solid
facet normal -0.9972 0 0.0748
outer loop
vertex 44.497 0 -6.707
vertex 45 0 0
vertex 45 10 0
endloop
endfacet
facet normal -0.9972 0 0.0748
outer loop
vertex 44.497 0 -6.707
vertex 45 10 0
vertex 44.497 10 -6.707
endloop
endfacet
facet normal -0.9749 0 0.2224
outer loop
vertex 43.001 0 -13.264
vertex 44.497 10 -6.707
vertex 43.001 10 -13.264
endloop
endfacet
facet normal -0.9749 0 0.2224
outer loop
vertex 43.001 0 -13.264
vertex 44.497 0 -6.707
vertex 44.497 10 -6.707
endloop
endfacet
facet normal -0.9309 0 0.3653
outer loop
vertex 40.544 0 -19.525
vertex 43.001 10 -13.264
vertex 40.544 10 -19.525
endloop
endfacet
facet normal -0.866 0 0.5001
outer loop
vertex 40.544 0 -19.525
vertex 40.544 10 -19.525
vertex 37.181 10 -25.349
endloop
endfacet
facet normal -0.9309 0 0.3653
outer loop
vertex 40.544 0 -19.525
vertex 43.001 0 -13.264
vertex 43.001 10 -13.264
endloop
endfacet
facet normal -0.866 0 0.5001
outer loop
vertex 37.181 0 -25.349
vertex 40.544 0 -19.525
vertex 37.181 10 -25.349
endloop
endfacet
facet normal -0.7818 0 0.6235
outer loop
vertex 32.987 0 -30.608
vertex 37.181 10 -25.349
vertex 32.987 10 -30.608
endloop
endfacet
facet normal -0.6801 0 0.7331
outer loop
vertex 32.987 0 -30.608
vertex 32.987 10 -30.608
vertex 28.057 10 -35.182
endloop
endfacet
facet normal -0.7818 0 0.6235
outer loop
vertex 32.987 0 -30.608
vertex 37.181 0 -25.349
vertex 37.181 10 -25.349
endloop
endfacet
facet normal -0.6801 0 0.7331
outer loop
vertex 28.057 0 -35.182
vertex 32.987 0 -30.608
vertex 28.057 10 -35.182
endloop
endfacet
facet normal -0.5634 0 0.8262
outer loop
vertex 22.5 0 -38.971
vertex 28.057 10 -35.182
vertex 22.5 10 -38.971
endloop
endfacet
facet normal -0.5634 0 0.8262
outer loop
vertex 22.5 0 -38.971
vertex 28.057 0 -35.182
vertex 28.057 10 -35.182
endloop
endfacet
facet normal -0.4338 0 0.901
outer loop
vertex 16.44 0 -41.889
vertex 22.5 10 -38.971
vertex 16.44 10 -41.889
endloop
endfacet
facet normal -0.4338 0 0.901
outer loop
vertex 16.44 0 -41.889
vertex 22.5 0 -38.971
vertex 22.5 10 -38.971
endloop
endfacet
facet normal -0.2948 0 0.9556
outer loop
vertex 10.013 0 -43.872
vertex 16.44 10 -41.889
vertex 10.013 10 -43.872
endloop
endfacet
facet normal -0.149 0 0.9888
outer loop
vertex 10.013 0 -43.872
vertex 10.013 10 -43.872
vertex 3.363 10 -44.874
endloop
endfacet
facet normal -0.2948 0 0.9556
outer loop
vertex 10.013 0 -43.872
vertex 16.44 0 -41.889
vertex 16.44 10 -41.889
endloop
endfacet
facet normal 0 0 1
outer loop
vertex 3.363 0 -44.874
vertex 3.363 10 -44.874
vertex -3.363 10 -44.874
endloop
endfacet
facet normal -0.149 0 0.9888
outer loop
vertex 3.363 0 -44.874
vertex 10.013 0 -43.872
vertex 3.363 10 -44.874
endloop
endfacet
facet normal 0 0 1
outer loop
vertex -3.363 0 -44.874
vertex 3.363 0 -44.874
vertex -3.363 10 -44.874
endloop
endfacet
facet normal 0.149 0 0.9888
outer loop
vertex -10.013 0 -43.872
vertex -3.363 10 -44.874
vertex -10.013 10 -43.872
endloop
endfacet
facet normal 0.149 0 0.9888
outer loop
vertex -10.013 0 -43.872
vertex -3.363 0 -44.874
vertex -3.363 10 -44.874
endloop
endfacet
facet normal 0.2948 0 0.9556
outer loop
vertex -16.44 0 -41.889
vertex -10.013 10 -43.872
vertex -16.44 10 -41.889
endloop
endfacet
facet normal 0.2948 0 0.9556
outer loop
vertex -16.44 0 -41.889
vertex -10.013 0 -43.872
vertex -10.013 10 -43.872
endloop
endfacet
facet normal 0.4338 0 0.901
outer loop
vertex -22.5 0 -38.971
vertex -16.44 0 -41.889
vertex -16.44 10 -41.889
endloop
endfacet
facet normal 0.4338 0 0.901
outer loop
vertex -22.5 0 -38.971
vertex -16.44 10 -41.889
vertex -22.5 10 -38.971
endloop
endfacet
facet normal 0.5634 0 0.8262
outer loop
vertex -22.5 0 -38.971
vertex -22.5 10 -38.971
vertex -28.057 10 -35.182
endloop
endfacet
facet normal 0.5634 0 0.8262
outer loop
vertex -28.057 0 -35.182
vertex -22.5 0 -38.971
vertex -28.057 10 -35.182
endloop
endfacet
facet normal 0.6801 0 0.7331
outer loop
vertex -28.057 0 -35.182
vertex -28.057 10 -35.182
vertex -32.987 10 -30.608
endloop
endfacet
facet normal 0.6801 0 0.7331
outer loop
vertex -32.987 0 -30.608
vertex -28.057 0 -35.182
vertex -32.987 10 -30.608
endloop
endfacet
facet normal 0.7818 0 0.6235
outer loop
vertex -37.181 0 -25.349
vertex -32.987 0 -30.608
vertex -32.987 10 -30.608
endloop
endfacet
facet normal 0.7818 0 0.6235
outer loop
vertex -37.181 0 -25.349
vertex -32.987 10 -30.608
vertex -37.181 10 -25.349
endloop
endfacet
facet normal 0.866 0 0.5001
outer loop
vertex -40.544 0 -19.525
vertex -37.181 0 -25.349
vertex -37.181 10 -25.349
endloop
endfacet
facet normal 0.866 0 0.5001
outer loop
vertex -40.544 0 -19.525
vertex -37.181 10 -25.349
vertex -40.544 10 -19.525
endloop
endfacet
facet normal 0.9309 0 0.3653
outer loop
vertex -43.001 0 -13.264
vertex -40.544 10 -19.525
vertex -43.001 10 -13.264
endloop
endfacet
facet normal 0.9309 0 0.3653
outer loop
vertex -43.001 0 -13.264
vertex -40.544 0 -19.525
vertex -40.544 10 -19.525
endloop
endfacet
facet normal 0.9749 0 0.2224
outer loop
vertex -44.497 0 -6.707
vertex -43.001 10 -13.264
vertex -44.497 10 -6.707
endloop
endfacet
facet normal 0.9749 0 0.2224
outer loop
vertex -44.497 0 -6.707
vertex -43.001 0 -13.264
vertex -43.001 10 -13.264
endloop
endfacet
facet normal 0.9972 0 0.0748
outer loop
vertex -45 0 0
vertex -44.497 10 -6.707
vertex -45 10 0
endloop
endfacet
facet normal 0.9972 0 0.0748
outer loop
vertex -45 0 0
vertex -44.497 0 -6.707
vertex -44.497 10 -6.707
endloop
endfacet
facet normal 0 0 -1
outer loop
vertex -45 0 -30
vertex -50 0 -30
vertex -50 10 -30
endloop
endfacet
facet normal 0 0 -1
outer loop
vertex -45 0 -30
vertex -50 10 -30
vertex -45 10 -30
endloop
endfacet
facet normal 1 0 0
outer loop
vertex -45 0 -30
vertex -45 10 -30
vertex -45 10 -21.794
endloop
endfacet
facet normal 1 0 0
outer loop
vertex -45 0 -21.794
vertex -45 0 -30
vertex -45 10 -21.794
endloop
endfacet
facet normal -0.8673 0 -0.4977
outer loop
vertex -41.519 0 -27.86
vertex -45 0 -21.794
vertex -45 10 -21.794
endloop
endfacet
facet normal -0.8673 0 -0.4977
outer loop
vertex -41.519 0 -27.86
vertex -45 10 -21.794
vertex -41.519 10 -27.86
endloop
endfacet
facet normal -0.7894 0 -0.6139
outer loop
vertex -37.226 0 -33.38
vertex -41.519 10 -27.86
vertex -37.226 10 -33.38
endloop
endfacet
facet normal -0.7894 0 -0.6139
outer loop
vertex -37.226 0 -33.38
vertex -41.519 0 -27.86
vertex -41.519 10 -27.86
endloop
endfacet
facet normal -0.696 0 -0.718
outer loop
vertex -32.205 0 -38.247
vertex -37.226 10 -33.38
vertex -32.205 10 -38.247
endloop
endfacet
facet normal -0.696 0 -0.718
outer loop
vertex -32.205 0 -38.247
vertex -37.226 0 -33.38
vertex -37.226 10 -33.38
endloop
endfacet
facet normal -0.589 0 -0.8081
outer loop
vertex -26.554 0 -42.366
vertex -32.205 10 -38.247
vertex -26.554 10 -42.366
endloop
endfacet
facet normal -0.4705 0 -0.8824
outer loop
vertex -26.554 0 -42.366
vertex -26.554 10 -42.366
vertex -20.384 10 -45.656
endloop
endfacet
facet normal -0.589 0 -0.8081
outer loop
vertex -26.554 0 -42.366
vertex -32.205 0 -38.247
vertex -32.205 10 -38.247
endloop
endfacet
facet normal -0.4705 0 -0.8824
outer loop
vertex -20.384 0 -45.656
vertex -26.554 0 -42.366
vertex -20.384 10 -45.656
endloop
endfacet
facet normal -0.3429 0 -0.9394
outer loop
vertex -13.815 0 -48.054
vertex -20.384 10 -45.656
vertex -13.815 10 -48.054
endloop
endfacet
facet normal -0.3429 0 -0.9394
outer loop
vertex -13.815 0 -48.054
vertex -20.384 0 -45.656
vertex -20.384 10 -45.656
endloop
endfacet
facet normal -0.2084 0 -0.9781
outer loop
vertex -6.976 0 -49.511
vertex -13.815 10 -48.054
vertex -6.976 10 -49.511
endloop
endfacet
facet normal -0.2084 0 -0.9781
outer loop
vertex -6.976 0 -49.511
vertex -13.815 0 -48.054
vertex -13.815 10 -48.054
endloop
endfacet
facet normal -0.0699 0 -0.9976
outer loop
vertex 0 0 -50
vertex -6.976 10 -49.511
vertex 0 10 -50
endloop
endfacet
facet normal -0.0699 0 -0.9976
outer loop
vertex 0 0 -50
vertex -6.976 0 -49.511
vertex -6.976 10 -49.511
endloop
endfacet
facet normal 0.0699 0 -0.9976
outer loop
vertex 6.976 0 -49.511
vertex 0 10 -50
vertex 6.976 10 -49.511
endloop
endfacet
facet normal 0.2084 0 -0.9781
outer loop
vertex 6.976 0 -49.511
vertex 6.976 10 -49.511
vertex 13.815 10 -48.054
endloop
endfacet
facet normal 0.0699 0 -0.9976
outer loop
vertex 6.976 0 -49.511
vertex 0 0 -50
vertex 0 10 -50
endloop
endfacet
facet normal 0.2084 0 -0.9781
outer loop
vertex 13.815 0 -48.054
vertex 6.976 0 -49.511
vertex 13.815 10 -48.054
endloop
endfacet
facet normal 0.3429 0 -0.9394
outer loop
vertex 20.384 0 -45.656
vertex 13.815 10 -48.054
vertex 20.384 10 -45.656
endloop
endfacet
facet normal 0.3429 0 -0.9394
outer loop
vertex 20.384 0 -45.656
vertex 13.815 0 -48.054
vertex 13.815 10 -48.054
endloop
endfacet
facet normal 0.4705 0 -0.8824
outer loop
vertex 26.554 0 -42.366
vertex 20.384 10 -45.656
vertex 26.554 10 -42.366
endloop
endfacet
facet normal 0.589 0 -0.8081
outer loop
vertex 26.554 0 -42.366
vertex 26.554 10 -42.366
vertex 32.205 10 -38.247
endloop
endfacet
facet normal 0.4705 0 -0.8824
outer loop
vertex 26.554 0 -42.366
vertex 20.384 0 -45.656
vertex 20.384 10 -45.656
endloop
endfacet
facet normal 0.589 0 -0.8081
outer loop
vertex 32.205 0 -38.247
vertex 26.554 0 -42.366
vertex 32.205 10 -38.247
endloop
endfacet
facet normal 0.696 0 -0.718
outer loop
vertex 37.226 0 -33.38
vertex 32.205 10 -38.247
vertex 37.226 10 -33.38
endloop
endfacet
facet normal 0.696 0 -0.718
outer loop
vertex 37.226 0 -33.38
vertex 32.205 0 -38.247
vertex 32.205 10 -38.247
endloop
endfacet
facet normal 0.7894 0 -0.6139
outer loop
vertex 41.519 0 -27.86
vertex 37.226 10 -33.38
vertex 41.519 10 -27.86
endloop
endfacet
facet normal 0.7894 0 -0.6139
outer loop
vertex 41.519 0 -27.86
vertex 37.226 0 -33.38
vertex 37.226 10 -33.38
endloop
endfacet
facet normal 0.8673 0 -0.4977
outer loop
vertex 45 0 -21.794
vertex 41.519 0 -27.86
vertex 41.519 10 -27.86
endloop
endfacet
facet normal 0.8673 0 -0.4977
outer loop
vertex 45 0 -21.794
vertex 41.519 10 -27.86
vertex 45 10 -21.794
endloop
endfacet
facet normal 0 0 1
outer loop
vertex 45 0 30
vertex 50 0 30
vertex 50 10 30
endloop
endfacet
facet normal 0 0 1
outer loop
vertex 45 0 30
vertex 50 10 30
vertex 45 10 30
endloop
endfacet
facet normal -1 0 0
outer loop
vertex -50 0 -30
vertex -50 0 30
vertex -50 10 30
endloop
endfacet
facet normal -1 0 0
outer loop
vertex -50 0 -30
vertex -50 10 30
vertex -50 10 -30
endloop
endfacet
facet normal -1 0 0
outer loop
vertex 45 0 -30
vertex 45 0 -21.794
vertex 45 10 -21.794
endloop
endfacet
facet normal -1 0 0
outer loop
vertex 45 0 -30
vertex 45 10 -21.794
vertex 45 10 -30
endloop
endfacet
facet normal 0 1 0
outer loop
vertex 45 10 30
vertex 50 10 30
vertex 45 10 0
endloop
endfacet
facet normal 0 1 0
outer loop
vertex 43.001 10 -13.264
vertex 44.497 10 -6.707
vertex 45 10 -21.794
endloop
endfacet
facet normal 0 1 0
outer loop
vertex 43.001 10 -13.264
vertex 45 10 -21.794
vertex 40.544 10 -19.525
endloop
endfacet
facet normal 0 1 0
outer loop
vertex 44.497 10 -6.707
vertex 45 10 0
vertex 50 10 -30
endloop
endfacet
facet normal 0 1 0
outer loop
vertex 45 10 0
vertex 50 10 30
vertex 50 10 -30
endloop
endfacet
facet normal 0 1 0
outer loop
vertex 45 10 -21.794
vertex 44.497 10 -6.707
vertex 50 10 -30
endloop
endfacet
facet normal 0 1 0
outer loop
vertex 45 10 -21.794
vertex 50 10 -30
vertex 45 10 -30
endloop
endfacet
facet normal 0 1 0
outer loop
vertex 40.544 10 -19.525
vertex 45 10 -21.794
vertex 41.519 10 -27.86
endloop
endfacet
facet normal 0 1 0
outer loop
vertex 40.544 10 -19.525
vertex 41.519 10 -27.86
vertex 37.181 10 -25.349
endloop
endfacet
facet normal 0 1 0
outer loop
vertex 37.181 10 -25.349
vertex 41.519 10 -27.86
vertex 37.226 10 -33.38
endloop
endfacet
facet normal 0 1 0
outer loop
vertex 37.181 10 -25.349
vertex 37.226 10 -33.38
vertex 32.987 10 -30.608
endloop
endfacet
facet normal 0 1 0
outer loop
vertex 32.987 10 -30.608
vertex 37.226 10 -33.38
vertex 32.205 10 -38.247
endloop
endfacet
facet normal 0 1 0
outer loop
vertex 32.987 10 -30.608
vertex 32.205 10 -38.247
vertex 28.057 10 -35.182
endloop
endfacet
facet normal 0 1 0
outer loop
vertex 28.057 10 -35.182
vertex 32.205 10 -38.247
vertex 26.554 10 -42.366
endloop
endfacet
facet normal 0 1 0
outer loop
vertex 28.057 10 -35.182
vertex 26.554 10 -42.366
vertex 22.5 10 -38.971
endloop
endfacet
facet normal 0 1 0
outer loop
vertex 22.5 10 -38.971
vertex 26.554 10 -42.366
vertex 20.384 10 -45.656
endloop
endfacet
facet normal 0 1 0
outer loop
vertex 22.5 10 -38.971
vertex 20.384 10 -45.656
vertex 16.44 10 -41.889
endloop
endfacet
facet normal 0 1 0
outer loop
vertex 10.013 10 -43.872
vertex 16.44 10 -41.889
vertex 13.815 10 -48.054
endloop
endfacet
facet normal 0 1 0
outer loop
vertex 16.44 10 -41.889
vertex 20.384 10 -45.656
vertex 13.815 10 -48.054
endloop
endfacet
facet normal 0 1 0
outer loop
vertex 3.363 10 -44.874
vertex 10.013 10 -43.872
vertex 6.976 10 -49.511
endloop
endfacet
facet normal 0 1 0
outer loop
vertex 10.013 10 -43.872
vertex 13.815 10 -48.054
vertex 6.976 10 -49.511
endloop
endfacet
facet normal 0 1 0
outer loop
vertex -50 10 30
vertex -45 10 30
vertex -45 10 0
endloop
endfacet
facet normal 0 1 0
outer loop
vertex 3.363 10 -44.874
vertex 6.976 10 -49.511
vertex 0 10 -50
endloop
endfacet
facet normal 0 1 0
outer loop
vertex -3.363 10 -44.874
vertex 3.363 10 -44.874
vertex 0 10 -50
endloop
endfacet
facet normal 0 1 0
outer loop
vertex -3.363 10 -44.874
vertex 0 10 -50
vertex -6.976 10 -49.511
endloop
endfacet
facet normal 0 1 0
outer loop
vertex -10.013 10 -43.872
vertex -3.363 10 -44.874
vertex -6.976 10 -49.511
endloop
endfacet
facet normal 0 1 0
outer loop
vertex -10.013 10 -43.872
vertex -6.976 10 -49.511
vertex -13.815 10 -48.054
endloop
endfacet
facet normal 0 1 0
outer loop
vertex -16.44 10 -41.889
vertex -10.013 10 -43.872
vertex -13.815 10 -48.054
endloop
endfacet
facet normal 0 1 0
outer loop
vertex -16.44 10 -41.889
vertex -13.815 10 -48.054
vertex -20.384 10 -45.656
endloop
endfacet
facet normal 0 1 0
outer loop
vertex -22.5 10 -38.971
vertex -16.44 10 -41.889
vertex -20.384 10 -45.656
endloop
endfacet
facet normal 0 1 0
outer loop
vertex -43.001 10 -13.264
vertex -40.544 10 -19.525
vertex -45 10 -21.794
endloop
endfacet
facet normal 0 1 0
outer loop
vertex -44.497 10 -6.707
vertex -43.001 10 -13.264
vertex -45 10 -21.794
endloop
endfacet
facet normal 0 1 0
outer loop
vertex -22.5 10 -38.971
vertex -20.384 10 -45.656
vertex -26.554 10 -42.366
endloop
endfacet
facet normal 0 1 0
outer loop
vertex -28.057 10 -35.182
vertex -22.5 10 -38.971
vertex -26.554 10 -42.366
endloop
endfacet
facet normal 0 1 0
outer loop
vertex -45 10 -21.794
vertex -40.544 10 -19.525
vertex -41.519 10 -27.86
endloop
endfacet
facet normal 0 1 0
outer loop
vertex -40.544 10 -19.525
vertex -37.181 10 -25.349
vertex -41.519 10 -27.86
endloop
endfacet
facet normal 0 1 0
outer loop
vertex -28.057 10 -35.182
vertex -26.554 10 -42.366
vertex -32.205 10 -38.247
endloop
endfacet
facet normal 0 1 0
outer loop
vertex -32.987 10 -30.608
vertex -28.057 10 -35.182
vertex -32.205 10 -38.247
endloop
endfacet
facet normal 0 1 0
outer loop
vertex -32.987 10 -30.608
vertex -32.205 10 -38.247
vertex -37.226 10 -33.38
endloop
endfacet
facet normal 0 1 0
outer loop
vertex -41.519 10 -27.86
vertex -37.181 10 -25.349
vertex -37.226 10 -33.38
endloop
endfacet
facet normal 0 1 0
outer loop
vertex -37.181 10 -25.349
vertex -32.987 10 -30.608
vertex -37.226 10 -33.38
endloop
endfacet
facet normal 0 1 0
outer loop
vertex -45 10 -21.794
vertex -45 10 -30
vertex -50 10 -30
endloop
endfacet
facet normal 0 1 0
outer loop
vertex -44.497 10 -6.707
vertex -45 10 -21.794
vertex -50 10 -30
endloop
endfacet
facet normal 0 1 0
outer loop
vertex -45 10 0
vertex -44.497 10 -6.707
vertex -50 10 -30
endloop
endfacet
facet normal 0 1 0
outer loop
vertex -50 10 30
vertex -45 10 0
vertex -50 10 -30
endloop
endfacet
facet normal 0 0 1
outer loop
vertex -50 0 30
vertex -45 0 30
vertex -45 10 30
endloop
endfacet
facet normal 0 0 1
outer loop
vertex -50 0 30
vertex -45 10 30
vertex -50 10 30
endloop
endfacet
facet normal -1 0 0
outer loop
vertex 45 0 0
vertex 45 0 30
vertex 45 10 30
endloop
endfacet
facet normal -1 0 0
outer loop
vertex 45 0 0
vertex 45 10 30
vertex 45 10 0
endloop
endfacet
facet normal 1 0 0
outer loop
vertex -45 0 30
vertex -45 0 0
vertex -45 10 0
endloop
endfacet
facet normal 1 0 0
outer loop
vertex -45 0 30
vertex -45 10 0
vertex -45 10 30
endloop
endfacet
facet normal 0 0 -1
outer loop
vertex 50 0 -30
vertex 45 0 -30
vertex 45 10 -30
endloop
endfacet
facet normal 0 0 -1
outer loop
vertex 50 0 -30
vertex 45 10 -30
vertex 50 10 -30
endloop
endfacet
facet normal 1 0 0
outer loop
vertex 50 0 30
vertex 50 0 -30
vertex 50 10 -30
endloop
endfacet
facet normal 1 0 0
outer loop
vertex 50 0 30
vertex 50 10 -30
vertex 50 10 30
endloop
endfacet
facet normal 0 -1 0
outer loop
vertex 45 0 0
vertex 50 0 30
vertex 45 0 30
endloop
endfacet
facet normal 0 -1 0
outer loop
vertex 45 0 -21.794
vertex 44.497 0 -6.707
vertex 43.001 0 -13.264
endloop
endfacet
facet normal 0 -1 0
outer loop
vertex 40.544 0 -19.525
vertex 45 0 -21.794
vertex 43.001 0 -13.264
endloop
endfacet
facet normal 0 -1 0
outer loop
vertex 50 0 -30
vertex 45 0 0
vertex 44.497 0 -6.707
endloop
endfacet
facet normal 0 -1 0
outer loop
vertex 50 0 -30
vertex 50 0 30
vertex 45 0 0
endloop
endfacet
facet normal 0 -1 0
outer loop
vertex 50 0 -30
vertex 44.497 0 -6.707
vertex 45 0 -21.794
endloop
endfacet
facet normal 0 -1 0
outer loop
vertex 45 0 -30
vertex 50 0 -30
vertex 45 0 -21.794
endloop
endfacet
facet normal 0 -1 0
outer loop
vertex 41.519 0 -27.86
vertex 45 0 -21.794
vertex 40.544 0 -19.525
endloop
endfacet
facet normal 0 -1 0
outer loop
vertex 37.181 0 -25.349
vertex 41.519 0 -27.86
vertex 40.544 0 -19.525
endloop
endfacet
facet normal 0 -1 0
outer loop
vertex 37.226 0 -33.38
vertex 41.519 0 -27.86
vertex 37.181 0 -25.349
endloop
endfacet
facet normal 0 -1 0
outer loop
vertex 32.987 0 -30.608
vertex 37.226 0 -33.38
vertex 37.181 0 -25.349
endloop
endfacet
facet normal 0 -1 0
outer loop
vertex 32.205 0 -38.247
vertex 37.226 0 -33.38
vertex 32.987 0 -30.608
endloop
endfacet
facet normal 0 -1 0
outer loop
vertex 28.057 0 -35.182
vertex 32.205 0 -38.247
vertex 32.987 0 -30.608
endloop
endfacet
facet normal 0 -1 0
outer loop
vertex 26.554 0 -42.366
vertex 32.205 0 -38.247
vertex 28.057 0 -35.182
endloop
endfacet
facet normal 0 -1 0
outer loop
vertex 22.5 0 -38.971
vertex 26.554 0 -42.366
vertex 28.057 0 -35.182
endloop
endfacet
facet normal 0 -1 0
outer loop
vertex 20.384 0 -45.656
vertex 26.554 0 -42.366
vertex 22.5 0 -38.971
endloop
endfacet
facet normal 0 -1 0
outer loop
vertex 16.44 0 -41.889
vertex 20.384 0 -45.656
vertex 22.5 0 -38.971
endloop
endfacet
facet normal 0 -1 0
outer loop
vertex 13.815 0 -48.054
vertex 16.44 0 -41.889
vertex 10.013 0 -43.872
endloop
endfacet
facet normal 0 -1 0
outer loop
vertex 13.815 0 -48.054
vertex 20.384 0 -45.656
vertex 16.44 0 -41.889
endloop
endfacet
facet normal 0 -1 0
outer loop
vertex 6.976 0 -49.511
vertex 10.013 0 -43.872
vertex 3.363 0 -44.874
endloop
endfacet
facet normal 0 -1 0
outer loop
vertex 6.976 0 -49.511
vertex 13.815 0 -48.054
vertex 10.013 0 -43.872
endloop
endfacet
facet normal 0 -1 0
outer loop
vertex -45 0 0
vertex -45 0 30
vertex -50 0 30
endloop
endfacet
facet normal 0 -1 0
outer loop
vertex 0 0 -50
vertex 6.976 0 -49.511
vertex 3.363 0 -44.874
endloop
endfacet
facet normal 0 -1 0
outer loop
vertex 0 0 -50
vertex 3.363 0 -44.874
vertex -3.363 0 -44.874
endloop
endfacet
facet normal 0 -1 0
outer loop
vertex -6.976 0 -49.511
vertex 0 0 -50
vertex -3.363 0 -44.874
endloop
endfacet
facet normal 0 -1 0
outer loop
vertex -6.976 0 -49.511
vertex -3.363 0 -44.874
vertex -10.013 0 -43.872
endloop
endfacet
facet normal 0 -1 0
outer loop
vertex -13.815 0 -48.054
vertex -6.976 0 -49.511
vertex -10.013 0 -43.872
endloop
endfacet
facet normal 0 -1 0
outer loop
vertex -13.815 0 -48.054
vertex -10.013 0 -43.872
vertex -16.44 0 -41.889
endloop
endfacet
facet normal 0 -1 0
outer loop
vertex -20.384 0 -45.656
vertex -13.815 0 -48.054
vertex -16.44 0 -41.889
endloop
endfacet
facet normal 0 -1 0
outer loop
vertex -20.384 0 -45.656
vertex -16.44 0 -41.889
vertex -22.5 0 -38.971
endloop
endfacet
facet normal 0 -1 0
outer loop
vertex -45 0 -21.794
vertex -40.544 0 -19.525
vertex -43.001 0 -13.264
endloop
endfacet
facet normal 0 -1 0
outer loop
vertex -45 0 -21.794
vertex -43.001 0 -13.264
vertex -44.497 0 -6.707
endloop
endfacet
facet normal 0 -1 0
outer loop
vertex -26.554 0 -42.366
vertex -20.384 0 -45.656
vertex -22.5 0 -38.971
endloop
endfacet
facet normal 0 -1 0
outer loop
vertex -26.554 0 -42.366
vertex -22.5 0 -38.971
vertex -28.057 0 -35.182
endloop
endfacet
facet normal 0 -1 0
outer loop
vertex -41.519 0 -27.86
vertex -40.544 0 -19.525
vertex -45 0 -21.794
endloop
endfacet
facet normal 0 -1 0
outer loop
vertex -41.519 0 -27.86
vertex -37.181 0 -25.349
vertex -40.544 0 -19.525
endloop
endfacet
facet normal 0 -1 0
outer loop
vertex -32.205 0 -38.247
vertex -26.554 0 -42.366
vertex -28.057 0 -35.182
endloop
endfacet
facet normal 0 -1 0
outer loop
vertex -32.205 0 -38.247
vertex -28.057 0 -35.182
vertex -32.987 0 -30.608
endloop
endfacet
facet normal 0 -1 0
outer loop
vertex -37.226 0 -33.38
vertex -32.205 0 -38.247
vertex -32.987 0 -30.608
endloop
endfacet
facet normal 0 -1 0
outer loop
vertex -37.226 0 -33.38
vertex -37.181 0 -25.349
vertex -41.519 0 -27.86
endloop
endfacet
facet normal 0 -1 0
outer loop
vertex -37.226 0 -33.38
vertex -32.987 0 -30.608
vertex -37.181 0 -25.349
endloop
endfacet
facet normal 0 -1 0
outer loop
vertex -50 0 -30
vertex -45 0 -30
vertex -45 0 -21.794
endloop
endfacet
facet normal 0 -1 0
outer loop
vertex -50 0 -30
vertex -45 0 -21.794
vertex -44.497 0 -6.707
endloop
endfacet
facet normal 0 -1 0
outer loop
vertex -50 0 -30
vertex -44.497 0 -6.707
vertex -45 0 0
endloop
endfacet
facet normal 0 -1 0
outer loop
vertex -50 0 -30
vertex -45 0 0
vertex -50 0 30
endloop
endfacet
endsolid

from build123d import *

# Parameters (mm, degrees)
EXTRUDE_1_DEPTH = 10


with BuildPart() as part:
    # 草图1 → 凸台-拉伸1 (new body)
    with BuildSketch(Plane(origin=(0, 0, 0), x_dir=(1, 0, 0), z_dir=(0, 1, 0))):
        with BuildLine():
            Line((-45, 0), (-45, -30))
            Line((-45, -30), (-50, -30))
            Line((-50, -30), (-50, 30))
            Line((-50, 30), (-45, 30))
            Line((-45, 30), (-45, 21.794494718))
            ThreePointArc((-45, 21.794494718), (0, 50), (45, 21.794494718))
            Line((45, 21.794494718), (45, 30))
            Line((45, 30), (50, 30))
            Line((50, 30), (50, -30))
            Line((50, -30), (45, -30))
            Line((45, -30), (45, 0))
            ThreePointArc((45, 0), (0, 45), (-45, 0))
        make_face()
    extrude(amount=EXTRUDE_1_DEPTH)


solid = part.part
